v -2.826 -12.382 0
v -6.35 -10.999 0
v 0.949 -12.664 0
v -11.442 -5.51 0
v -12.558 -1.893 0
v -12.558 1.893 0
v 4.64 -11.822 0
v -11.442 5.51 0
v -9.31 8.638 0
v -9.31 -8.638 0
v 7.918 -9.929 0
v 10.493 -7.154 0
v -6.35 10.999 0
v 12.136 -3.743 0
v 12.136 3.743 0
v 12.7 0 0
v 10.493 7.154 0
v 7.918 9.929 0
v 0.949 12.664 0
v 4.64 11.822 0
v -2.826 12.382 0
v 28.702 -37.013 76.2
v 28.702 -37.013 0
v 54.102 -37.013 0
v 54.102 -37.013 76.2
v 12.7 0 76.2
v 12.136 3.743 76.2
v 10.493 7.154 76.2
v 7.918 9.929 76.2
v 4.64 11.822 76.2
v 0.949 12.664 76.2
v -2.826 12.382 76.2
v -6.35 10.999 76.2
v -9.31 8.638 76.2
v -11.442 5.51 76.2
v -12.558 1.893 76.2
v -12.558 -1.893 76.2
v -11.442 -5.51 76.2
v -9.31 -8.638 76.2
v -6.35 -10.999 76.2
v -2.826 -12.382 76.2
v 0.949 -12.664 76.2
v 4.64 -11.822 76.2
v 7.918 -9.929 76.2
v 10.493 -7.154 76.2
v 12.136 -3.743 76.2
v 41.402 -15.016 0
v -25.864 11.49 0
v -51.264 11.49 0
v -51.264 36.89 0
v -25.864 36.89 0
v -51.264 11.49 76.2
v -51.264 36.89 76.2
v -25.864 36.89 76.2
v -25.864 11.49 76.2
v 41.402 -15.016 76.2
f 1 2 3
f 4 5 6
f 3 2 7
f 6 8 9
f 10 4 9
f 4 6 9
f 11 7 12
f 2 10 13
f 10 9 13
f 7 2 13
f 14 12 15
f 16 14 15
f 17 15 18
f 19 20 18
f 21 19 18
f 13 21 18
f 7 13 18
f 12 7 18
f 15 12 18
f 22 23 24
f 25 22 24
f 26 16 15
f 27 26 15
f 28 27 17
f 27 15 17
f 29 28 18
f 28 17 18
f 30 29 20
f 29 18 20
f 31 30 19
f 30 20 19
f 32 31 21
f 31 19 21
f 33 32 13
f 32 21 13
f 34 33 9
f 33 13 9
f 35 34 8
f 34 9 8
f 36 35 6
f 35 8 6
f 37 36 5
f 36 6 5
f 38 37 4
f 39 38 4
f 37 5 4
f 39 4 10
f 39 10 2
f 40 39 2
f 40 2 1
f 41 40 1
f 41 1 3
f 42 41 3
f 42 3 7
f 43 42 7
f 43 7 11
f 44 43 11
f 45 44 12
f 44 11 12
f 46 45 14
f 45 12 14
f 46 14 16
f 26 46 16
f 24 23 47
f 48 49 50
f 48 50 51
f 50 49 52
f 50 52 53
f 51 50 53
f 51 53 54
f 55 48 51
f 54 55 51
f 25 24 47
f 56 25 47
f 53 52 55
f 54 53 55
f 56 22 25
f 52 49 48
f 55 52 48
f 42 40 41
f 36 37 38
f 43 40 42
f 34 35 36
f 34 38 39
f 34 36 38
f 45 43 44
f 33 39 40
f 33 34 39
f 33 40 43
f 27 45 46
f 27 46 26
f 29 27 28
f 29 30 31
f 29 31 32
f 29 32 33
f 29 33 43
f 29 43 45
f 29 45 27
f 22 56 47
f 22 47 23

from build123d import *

# Parameters (mm, degrees)
F0_R     = 12.7
F2_DEPTH = 76.2
F1_W     = 25.4
F1_H     = 25.4
F4_DEPTH = 76.2
F5_DEPTH = 76.2


with BuildPart() as f2:
    # F0 (on Top) → F2 (new body)
    with BuildSketch(Plane.XY):
        Circle(F0_R)
    extrude(amount=F2_DEPTH)


with BuildPart() as f4:
    # F1 (on Top) → F4 (new body)
    with BuildSketch(Plane.XY):
        with Locations((-38.564378, 24.189506)):
            Rectangle(F1_W, F1_H)
    extrude(amount=F4_DEPTH)


with BuildPart() as f5:
    # F3 (on face) → F5 (new body)
    with BuildSketch(Plane.XY):
        Polygon((54.10165, -37.012935), (41.40165, -15.015889), (28.70165, -37.012935), align=None)
    extrude(amount=F5_DEPTH)


solid = Compound([f2.part, f4.part, f5.part])
